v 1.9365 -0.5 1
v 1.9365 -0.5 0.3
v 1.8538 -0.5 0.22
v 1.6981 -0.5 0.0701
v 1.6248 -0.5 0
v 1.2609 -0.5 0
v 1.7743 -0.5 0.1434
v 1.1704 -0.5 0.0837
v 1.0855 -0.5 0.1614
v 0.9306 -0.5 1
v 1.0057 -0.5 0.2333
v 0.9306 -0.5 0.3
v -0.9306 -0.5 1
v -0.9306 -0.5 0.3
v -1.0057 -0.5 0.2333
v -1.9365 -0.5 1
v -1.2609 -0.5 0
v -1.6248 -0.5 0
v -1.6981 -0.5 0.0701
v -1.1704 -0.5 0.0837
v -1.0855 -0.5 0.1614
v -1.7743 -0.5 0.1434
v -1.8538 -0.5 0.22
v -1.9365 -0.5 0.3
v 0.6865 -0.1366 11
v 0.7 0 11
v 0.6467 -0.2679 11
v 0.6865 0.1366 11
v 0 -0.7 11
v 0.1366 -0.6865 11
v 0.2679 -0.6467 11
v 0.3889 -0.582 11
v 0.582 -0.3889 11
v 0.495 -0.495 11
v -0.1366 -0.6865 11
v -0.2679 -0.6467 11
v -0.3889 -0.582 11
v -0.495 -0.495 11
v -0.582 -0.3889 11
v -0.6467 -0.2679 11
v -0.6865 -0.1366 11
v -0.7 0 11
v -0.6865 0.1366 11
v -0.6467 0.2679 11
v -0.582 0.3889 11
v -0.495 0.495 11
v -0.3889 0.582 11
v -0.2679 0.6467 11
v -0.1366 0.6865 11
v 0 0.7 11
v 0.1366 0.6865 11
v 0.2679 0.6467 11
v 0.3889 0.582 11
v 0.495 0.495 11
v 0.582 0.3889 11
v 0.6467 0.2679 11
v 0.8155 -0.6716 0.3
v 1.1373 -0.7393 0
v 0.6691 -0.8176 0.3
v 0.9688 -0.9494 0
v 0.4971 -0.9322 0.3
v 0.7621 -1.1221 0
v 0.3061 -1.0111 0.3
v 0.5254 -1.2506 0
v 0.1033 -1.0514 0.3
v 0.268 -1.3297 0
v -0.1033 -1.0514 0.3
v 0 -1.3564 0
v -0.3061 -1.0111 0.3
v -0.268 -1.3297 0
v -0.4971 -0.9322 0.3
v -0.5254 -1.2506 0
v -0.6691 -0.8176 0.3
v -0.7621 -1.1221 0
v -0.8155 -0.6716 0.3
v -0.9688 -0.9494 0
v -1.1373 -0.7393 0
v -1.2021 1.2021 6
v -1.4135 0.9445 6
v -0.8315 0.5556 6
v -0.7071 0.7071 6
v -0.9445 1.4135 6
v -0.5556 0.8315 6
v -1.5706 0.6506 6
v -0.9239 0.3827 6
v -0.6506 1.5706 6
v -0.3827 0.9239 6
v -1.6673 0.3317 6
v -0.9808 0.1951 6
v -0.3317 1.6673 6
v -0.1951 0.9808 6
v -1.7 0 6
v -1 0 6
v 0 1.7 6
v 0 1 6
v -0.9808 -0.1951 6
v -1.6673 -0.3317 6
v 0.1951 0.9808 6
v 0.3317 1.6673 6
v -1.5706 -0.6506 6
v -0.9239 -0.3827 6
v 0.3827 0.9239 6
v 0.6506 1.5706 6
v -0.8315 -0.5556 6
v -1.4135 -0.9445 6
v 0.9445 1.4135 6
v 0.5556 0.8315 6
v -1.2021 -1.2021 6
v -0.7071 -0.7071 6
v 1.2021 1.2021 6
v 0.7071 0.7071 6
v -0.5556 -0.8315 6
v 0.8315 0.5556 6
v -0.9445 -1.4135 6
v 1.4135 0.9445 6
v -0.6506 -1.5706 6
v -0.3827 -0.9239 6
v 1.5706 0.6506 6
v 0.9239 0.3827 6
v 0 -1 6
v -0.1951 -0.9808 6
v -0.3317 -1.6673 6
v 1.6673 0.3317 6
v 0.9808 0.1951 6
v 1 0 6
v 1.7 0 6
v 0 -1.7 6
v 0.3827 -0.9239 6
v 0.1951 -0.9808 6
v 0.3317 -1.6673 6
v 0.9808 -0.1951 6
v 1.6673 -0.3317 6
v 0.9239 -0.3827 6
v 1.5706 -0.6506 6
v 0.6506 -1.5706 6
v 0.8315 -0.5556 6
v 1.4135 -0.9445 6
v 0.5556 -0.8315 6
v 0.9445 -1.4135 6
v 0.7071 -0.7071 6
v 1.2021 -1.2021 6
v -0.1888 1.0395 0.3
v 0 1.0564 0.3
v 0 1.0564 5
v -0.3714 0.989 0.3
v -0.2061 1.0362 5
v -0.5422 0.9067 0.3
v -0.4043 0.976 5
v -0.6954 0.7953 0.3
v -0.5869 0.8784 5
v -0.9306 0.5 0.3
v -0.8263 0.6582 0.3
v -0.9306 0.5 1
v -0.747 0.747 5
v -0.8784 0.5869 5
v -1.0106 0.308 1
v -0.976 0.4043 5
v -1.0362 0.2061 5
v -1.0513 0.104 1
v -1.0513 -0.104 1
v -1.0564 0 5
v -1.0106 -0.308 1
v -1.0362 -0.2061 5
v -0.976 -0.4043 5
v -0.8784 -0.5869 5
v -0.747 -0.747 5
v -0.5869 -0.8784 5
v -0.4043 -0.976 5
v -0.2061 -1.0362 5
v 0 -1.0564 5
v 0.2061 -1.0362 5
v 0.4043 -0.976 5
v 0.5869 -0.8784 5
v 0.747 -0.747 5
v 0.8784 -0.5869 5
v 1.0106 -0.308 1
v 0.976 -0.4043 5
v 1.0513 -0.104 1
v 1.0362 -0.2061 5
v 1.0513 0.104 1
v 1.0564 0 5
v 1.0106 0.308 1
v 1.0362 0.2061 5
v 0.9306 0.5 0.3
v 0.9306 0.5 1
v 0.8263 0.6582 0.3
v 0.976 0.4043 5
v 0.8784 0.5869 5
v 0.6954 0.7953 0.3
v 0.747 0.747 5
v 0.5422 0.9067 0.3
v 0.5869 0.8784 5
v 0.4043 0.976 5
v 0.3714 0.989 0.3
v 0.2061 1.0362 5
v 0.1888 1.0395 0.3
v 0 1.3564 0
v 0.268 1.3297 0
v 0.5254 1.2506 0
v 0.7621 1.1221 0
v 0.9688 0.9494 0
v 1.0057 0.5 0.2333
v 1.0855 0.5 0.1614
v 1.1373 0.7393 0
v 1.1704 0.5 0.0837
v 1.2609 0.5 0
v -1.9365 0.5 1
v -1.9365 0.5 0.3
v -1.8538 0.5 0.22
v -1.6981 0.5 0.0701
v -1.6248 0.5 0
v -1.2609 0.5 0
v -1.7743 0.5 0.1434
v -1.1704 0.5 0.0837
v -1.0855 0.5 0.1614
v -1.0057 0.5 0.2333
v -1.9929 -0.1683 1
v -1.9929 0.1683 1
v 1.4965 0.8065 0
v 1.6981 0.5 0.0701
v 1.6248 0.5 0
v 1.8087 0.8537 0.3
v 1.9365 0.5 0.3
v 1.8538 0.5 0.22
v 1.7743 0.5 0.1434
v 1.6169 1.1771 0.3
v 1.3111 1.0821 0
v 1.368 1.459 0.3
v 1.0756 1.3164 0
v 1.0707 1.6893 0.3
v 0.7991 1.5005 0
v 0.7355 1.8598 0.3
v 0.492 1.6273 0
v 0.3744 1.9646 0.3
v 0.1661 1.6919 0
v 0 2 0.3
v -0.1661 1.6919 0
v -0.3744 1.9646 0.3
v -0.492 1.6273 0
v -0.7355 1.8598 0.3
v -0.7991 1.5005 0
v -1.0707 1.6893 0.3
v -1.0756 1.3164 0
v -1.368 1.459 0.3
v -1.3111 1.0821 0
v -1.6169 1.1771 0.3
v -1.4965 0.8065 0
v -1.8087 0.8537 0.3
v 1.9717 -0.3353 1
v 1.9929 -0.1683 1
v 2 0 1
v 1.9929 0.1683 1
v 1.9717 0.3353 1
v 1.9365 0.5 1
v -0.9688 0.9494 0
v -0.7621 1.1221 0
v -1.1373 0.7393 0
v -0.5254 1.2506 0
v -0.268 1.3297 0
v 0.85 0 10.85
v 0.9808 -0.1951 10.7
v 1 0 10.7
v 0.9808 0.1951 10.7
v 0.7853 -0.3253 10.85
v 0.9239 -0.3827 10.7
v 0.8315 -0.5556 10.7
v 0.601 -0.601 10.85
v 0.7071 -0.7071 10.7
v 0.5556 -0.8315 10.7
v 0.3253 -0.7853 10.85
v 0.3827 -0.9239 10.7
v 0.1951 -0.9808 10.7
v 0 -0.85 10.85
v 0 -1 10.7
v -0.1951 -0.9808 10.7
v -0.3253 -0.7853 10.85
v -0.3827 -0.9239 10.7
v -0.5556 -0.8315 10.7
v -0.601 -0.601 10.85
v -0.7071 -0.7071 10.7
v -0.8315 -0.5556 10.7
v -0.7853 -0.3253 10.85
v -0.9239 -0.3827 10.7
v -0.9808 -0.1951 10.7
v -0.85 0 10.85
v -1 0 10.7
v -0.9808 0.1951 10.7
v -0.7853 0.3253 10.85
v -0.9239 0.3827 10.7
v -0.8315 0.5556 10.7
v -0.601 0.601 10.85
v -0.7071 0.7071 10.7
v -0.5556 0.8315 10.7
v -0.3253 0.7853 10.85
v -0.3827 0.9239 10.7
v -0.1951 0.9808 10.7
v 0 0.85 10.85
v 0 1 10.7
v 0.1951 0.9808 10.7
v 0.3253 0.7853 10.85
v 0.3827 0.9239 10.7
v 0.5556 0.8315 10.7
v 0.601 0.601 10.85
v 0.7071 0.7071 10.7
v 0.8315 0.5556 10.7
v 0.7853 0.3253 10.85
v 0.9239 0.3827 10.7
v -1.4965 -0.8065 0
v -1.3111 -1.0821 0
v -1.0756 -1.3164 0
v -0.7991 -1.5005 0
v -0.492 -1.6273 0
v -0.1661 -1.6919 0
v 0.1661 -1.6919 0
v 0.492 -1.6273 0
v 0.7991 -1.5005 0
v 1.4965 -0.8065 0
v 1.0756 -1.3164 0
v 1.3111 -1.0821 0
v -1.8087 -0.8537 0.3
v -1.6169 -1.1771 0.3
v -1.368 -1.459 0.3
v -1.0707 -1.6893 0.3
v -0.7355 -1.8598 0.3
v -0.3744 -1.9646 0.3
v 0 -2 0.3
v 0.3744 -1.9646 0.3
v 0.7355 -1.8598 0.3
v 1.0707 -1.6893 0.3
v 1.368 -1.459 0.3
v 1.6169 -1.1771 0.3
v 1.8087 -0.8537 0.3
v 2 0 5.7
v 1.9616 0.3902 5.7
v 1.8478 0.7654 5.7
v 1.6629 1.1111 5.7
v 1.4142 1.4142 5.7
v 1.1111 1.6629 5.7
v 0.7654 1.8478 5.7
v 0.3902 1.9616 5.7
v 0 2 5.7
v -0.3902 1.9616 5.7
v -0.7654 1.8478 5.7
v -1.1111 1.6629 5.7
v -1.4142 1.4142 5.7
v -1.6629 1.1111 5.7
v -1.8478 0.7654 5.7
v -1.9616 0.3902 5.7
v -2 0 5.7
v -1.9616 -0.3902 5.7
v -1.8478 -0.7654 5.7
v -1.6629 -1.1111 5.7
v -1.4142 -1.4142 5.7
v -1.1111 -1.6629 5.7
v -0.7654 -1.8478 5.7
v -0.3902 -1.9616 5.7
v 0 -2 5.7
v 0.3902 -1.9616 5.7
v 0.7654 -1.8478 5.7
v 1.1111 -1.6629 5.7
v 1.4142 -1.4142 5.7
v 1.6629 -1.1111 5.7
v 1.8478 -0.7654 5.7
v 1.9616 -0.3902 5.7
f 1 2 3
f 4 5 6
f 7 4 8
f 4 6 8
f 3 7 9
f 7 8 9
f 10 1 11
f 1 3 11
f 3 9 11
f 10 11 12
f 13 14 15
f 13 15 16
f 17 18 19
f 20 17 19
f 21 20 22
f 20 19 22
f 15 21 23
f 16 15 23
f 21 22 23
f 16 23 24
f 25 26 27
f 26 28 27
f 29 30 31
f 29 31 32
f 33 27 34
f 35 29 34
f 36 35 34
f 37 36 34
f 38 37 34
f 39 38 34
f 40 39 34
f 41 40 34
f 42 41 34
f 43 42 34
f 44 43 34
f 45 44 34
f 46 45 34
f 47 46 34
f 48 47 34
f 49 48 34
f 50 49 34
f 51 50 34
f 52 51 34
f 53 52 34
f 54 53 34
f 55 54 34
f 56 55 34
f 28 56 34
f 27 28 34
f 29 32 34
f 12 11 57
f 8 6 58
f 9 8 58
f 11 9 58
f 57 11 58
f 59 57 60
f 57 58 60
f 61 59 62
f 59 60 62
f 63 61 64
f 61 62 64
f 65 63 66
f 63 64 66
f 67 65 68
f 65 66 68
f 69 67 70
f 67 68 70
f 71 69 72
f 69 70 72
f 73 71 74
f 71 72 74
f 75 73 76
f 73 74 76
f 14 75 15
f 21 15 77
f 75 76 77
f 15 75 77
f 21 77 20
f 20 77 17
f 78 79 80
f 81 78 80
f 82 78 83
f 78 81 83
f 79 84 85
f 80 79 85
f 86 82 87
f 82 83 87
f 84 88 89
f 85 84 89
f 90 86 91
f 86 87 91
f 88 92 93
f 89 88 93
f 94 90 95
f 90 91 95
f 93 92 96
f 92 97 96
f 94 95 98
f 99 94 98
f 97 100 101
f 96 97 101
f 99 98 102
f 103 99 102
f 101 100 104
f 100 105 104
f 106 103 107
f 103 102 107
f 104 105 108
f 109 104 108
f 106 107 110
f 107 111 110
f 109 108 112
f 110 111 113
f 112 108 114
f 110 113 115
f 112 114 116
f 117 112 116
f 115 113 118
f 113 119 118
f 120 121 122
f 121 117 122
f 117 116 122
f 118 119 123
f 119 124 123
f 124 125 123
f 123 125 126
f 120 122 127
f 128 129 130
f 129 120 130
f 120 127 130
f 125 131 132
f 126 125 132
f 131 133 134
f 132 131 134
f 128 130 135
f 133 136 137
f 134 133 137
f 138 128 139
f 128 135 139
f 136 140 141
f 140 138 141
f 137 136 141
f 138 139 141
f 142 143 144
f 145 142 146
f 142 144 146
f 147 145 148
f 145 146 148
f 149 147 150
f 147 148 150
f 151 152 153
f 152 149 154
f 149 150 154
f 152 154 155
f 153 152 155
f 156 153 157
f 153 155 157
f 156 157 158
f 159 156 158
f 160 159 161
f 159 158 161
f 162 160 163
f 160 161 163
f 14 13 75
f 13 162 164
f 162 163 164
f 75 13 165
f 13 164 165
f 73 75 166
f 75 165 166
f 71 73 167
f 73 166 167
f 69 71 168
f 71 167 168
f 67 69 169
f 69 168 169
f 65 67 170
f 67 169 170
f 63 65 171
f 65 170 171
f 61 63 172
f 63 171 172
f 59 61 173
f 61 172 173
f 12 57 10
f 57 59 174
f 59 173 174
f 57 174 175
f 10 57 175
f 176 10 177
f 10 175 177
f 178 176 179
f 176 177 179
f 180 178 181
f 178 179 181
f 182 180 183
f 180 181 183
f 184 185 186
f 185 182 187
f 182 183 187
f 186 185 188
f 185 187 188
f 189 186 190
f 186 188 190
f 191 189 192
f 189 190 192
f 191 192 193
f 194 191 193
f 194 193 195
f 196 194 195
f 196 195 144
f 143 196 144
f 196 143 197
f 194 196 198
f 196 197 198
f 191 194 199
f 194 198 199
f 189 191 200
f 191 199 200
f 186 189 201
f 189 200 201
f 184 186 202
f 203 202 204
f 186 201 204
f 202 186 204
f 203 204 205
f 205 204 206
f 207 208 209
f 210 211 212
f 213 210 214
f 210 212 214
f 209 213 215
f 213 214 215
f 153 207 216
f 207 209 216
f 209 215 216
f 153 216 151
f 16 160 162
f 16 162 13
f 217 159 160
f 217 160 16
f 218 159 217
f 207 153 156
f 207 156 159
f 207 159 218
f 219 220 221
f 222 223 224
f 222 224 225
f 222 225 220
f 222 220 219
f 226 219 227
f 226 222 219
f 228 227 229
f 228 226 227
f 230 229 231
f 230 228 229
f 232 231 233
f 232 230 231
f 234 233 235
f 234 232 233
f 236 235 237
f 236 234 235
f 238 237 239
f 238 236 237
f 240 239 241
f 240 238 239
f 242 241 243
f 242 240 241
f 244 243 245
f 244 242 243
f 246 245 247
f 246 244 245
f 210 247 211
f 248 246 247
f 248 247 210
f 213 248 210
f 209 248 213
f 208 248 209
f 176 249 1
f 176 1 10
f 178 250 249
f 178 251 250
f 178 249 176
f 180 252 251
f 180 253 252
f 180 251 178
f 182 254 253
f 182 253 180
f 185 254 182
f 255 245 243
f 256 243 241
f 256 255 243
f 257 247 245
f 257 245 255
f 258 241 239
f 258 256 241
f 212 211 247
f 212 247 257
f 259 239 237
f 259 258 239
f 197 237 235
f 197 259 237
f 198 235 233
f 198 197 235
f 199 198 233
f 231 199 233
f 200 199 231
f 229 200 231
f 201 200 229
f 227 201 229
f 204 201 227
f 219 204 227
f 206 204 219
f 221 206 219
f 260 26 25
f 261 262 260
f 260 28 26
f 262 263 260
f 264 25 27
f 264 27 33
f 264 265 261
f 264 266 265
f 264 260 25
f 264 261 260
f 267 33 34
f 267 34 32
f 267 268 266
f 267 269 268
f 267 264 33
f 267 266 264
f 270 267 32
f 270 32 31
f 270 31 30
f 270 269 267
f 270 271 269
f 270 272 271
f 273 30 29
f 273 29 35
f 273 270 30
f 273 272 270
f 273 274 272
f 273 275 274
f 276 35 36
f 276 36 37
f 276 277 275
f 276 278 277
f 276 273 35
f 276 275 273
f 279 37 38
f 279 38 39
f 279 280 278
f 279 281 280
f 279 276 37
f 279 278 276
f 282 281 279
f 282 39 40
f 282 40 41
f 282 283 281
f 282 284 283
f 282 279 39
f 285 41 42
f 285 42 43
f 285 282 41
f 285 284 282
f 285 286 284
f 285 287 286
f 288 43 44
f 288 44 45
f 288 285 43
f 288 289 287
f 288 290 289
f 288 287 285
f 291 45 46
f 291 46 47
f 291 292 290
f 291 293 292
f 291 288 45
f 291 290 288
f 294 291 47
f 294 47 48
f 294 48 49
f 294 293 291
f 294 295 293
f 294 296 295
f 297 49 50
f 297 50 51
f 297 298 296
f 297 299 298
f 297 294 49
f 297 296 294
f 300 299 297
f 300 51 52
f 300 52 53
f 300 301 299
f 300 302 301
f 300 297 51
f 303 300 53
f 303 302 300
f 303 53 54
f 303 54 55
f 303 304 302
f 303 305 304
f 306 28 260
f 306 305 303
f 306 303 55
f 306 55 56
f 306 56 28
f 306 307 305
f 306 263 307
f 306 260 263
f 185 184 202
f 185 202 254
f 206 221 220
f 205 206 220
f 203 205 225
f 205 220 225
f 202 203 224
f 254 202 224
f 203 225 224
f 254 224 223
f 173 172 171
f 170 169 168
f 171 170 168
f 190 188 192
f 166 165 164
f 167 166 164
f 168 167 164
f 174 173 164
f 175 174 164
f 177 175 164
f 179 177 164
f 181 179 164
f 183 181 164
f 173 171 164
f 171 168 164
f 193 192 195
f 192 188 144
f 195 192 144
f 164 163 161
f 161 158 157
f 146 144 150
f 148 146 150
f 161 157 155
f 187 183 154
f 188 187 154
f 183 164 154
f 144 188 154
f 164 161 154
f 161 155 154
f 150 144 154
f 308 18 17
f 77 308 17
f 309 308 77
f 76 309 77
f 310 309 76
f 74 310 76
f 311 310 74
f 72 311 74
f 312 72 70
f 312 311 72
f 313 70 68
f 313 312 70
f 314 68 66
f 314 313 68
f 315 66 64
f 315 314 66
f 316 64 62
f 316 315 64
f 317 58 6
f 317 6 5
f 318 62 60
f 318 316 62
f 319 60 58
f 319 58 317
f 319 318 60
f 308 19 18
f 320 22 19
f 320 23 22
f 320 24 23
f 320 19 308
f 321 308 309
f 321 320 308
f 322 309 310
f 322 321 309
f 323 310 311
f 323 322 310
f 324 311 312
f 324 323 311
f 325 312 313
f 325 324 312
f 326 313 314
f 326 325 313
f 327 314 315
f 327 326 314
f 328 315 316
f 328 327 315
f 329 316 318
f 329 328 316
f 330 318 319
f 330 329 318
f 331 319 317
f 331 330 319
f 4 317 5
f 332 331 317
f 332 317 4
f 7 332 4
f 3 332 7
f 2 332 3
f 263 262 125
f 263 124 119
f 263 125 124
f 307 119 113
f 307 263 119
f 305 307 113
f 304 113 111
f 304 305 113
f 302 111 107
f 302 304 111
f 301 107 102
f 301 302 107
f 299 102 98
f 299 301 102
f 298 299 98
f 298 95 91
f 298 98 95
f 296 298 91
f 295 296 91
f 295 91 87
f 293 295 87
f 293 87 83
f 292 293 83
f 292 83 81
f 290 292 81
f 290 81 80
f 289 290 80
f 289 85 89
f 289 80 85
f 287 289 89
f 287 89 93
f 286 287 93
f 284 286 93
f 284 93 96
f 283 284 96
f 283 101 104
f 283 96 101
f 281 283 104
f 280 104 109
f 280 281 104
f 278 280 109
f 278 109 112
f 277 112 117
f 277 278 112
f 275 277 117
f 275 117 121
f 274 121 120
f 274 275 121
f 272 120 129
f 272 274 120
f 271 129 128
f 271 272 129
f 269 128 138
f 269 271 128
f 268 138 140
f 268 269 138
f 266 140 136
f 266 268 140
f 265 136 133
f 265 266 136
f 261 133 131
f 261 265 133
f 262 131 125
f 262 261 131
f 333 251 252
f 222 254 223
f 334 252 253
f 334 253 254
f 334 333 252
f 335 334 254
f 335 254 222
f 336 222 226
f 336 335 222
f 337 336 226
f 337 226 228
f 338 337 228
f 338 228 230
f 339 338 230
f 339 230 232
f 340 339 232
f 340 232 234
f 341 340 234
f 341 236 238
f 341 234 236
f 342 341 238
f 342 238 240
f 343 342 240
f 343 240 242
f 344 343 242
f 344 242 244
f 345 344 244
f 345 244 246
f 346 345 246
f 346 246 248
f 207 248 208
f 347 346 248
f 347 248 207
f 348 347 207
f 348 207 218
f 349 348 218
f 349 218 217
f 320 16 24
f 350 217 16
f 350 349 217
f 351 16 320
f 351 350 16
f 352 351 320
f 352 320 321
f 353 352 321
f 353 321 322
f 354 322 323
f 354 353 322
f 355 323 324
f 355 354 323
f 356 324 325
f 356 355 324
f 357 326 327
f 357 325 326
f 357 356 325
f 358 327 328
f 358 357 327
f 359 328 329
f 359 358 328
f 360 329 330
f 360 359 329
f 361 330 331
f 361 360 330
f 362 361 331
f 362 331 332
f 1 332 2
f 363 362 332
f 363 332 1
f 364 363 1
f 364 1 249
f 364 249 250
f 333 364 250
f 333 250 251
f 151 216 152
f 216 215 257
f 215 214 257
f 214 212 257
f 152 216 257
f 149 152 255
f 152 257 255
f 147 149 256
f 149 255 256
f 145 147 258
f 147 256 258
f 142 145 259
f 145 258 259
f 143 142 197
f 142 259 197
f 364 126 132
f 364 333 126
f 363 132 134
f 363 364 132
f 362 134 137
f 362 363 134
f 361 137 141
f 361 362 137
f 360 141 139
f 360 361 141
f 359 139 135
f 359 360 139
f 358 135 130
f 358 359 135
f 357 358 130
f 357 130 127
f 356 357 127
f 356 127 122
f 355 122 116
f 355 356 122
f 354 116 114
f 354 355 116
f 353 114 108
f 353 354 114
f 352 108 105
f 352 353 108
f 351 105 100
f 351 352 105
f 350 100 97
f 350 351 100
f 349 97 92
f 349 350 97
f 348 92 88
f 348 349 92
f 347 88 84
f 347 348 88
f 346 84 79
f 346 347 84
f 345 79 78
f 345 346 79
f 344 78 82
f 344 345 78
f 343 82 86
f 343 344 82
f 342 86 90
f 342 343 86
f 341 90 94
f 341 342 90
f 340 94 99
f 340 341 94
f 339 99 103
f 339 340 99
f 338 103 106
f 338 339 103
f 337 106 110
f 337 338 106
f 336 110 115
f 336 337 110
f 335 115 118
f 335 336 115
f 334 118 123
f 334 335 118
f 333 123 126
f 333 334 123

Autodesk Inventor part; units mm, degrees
ref_plane "YZ Plane" through (0, 0, 0) normal (1, 0, 0) x (0, 1, 0)
ref_plane "XZ Plane" through (0, 0, 0) normal (0, 1, 0) x (-1, 0, 0)
ref_plane "XY Plane" through (0, 0, 0) normal (0, 0, 1) x (1, 0, 0)
sketch "Sketch1" plane through (0, 0, 0) normal (0, 1, 0) x (-1, 0, 0)
  line L0 (0, 0) -> (-2, 0)
  line L1 (-2, 0) -> (-2, 6)
  line L2 (-2, 6) -> (-1, 6)
  line L3 (-1, 6) -> (-1, 11)
  line L4 (-1, 11) -> (0, 11)
  line L5 (0, 11) -> (0, 0)
  dimension "d1" = 5
  dimension "d2" = 6
  dimension "d3" = 2
  dimension "d4" = 4
revolve "Revolution1" add sketch "Sketch1" angle 360 about axis through (0, 0, 11) along (0, 0, -1)
sketch "Sketch2" plane through (0, 0, 0) normal (0, 0, -1) x (-1, 0, 0)
  line L0 (-2, -0.5) -> (2, -0.5)
  line L1 (2, -0.5) -> (2, 0.5)
  line L2 (2, 0.5) -> (-2, 0.5)
  line L3 (-2, 0.5) -> (-2, -0.5)
  line L4 (-2, -0.5) -> (2, 0.5) construction
  line L5 (2, -0.5) -> (-2, 0.5) construction
  circle A0 centre (0, 0) radius 2 projected
  dimension "d6" = 1
extrude "Extrusion1" cut sketch "Sketch2" against normal blind 1 contours L3 A0 L0 | A0 L2 L0 | L3 L2 A0 | A0 L1 L0 | A0 L2 L1
hole "Hole1" at (0, 0, 0) direction (0, 0, 1) diameter 2.1129 depth 5 thread size "M2.6x0.45" class "6H" standard "ANSI Metric M Profile"
thread "Thread1" size "M2x0.4" class "6g" standard "ANSI Metric M Profile" full length
chamfer "Chamfer1" distance 0.3 angle 45 7 edges at (-2, 0, 6) (0, 2, 0) (0, -2, 0) (0, -1.0564, 0) (-0.5421, 0.9067, 0) (0.5421, 0.9067, 0) (-1, 0, 11)
properties part number "BRU-2006S" material "Stainless Steel AISI 304"
